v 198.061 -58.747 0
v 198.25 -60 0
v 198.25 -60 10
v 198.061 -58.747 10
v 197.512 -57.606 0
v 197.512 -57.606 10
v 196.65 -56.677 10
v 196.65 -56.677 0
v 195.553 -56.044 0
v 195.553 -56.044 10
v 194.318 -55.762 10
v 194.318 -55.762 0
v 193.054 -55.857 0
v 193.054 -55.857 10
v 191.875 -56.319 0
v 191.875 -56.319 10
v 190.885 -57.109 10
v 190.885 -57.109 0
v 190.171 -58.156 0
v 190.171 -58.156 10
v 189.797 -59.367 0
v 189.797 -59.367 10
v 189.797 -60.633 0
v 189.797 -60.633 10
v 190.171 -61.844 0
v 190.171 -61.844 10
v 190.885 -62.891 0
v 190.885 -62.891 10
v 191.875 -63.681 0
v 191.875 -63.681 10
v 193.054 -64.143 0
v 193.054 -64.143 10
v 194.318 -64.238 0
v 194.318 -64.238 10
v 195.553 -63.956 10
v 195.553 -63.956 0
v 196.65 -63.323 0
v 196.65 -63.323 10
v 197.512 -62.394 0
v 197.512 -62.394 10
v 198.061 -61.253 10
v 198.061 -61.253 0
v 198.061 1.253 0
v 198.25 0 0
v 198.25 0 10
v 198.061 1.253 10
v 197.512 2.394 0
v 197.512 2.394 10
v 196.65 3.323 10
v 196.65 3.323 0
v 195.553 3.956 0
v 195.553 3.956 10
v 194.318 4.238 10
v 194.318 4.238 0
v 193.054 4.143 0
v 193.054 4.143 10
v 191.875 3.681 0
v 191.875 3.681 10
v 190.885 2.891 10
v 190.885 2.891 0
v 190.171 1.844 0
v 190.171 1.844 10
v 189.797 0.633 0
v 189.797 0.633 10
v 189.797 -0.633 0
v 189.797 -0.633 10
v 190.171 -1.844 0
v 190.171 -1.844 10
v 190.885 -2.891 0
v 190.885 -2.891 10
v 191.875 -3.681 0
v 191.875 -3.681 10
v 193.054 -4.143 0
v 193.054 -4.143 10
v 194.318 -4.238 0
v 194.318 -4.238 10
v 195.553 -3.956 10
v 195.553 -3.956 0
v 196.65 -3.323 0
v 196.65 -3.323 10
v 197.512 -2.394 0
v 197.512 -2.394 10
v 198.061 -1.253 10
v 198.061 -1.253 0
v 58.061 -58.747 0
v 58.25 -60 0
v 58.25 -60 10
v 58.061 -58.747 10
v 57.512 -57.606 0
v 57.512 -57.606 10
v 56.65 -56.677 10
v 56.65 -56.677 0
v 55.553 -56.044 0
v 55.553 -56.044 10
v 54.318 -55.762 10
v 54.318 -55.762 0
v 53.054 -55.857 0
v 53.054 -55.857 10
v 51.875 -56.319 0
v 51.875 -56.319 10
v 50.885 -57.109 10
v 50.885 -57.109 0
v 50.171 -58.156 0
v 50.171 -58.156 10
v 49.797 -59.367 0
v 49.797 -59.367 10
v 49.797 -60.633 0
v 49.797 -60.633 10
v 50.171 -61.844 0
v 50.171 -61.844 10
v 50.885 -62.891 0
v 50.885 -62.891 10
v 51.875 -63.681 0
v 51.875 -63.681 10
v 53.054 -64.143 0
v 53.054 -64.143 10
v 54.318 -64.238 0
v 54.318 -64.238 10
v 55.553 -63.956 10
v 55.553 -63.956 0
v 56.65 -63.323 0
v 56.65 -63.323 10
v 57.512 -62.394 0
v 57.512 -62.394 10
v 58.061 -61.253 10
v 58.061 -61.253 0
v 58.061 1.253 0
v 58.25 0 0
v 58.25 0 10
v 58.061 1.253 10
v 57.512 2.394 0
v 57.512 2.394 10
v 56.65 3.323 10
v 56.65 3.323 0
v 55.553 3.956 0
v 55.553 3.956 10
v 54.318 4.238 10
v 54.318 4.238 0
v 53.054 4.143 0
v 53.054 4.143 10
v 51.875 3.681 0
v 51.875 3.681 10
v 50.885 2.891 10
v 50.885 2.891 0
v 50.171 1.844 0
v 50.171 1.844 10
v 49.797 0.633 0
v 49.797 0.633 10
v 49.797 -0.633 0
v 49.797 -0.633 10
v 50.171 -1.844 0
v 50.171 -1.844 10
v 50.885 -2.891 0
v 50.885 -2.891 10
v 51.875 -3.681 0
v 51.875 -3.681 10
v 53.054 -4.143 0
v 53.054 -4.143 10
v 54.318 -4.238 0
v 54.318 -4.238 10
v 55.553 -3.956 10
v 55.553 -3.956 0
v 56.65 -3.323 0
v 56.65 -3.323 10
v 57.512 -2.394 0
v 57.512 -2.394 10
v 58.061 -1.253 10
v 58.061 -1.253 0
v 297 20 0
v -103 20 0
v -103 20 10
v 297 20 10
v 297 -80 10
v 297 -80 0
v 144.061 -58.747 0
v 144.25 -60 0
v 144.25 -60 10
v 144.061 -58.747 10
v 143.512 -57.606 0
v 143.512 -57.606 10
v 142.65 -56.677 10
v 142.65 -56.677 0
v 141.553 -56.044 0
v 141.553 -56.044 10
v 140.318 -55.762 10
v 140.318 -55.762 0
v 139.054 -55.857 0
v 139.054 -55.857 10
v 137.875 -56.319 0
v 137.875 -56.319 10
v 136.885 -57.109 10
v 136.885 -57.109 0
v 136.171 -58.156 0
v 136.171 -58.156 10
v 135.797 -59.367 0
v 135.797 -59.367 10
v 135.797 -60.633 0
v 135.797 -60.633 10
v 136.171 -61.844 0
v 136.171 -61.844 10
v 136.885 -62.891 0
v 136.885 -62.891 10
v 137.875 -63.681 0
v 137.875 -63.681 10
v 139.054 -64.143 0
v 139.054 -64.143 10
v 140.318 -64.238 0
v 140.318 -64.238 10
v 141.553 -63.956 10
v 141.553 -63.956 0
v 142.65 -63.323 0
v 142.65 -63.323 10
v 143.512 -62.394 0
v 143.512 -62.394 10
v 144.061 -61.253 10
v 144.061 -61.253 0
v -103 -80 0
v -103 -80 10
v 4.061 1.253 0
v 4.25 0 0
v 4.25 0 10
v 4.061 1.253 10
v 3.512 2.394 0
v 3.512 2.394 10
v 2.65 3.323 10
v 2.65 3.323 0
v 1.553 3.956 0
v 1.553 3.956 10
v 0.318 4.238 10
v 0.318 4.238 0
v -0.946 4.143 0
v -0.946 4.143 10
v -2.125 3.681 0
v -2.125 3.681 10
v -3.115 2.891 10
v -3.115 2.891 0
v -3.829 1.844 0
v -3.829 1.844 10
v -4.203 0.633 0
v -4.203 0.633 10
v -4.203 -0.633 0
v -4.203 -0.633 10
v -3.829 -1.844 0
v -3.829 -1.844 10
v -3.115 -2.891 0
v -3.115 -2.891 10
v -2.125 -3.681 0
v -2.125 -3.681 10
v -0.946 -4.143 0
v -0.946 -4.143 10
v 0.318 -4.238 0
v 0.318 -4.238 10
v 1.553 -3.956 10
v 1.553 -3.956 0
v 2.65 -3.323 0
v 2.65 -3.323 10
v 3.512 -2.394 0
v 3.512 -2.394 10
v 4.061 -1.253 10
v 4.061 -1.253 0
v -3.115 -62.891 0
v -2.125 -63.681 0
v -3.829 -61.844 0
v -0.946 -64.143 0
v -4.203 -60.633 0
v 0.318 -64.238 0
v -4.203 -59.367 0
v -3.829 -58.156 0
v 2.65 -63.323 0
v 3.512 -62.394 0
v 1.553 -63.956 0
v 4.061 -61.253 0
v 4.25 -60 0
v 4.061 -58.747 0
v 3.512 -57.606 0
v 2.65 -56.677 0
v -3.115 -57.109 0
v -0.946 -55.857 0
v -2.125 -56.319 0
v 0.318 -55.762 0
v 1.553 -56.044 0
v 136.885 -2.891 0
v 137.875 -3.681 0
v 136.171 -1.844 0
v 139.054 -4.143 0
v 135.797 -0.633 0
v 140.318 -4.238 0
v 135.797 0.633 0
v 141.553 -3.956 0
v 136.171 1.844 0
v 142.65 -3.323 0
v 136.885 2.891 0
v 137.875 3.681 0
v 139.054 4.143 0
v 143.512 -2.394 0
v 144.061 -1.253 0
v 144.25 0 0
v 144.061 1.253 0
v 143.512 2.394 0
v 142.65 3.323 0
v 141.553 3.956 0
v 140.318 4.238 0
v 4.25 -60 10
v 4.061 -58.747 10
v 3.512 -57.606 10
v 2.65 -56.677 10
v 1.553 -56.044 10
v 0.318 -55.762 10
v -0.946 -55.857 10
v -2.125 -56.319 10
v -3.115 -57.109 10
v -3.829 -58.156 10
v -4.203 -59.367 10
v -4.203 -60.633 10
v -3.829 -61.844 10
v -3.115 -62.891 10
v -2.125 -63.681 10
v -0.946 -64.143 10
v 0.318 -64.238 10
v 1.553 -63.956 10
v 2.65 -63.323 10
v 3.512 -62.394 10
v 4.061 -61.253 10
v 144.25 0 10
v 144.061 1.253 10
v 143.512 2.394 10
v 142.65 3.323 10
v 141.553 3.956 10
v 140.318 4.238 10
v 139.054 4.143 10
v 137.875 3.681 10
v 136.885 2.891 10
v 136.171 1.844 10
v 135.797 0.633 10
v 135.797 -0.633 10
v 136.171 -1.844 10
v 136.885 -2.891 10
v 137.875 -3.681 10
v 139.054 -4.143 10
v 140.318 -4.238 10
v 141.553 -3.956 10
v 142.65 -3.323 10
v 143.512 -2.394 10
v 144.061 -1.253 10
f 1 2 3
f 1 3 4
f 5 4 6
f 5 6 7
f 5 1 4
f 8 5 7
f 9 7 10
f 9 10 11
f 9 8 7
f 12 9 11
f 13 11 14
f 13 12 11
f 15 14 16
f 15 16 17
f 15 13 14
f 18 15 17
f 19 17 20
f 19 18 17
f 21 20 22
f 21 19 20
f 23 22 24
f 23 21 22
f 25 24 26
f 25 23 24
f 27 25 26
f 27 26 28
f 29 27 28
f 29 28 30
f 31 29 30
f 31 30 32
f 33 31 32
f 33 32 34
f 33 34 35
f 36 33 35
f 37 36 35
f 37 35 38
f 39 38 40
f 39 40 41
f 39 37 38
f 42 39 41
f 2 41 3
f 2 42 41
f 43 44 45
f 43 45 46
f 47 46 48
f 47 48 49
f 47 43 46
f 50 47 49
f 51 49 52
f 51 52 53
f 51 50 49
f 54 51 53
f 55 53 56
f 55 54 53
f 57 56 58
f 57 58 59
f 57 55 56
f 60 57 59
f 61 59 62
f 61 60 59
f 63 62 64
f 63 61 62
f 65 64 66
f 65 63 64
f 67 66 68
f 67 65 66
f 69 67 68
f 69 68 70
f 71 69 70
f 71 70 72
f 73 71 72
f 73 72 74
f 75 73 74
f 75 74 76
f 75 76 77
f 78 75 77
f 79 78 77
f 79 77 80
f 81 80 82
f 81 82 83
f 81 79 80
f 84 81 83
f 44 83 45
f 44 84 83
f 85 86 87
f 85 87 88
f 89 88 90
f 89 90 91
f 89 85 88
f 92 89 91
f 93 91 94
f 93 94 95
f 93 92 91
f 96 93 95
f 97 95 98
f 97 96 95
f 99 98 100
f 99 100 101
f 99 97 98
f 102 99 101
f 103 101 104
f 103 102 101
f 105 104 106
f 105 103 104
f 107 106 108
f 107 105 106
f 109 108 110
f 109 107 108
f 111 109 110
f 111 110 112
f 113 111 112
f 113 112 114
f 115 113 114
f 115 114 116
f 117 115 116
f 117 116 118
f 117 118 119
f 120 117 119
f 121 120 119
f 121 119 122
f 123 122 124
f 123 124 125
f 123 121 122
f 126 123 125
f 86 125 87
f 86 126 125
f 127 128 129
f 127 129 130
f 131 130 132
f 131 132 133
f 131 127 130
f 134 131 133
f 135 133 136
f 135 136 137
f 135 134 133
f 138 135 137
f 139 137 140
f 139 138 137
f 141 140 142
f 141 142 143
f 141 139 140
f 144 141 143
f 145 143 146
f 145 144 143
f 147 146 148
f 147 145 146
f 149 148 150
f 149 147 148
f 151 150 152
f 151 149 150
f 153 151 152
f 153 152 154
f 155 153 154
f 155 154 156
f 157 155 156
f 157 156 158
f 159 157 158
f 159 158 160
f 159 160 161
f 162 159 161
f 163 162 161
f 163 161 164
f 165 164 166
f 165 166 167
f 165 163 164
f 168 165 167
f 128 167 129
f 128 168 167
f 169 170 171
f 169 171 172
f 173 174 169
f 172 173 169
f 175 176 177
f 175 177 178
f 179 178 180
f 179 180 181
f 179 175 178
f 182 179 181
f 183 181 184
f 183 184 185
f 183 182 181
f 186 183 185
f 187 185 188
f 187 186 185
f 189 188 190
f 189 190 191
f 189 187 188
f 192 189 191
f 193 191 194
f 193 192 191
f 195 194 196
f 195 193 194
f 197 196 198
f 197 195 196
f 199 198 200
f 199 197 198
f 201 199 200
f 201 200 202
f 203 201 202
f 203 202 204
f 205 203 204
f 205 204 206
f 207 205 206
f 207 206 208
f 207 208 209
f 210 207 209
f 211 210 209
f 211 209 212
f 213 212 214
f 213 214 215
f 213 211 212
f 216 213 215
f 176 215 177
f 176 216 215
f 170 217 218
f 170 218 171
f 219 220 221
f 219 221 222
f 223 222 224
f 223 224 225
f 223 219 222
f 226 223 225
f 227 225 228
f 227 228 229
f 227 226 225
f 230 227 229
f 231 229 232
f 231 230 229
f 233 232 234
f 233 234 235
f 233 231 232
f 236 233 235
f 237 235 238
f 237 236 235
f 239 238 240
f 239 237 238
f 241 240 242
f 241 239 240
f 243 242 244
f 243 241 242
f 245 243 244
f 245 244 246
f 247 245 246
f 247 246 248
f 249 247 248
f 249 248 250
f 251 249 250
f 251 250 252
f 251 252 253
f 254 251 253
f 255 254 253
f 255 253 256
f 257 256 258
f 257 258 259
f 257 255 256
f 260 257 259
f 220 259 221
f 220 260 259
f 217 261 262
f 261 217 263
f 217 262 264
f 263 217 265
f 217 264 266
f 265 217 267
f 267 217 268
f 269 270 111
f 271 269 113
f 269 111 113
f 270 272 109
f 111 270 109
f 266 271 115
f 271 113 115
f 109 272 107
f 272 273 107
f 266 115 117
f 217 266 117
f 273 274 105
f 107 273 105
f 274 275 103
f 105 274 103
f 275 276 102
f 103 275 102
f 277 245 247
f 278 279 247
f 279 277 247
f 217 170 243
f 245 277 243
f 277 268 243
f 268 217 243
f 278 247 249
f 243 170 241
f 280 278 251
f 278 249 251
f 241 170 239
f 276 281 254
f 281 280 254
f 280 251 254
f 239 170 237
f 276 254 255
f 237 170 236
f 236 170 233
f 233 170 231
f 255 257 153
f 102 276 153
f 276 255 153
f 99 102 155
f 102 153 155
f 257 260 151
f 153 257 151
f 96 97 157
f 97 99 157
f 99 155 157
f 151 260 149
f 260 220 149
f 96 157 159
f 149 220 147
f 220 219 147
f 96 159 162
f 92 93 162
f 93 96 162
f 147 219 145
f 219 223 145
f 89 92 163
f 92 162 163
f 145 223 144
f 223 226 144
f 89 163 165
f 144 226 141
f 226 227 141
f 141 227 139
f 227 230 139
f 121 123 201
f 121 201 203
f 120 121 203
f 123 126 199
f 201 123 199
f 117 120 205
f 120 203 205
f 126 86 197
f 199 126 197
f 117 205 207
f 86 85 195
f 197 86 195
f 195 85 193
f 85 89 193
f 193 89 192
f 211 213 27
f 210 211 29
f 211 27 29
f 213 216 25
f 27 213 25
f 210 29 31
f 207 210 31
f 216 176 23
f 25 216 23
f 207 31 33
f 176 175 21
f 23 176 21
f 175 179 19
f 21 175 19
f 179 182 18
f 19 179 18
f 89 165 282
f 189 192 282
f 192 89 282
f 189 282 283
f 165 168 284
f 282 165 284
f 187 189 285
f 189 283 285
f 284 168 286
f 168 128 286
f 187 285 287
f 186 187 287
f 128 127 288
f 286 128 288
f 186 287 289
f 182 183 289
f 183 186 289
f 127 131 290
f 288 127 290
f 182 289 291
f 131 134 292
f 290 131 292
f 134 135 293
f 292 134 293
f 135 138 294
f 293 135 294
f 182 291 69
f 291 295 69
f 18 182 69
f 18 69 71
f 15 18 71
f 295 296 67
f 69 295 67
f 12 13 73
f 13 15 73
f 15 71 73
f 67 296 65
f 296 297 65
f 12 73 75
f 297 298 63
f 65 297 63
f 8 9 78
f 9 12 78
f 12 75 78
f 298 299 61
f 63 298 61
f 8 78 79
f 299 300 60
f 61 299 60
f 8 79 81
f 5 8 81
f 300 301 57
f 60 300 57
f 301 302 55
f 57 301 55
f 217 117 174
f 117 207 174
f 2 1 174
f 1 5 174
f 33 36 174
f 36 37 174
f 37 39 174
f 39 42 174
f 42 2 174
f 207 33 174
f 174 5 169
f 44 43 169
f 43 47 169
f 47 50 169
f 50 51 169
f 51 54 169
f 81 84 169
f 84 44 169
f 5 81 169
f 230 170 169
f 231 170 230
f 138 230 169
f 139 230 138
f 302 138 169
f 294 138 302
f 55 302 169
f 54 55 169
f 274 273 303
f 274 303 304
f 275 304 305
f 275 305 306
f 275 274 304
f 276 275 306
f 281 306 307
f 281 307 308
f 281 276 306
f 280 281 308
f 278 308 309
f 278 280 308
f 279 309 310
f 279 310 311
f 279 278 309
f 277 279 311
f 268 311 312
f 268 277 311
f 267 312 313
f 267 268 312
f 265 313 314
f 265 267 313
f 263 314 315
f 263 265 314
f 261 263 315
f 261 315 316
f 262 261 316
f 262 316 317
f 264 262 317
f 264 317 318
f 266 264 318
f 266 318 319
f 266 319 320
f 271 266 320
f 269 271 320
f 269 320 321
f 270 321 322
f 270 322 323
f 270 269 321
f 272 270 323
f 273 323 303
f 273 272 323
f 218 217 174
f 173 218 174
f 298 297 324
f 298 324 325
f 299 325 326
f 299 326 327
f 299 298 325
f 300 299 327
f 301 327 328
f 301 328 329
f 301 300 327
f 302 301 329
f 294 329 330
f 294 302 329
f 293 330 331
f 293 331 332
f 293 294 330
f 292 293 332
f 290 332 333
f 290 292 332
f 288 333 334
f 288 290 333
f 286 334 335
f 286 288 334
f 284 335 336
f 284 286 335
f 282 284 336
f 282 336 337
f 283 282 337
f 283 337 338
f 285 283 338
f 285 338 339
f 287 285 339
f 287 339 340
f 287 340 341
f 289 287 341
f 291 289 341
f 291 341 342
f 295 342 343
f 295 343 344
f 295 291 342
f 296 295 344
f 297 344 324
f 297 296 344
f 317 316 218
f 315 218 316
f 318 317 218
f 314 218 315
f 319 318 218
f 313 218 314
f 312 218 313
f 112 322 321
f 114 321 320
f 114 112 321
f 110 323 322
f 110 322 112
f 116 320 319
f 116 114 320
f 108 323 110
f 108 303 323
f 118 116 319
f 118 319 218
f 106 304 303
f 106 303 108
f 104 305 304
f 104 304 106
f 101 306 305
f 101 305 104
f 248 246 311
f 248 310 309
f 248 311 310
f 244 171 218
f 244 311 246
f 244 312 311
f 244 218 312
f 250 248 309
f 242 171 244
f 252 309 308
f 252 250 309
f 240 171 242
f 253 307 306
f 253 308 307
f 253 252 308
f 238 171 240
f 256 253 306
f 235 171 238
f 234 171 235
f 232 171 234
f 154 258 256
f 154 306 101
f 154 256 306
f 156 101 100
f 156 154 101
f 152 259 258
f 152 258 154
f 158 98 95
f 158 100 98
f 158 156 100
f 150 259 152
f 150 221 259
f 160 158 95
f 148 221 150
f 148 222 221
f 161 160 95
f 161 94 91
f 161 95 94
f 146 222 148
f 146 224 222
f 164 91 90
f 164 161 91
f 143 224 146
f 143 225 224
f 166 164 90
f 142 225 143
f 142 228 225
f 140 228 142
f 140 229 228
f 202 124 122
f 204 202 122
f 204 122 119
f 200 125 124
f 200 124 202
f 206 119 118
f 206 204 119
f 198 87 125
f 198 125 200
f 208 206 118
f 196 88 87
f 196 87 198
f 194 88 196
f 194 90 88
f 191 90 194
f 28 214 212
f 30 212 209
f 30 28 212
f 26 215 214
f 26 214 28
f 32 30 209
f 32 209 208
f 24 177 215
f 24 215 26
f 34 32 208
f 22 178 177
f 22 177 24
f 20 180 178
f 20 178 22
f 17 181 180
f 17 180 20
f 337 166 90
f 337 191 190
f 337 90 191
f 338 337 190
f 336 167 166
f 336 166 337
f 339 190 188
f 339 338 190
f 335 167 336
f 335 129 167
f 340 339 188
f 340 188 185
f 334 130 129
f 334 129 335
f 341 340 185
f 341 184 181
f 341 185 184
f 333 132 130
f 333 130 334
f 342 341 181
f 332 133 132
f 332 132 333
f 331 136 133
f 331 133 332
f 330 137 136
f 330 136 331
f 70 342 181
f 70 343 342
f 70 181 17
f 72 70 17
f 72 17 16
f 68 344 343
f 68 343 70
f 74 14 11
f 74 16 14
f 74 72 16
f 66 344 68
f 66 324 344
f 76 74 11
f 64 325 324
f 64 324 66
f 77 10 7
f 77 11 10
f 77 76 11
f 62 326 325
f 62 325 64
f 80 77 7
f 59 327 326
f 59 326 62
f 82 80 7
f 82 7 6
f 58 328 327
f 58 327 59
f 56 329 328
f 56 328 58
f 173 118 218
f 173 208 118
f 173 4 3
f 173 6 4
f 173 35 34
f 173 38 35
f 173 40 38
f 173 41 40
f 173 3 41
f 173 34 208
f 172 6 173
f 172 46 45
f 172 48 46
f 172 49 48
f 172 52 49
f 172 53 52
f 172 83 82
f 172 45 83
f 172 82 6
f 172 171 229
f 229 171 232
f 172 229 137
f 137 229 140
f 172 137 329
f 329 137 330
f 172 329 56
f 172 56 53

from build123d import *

# Parameters (mm, degrees)
F0_W     = 400
F0_H     = 100
F0_R     = 4.25
F1_DEPTH = 10


with BuildPart() as f1:
    # F0 (on Top) → F1 (new body)
    with BuildSketch(Plane.XY):
        with Locations((97, -30)):
            Rectangle(F0_W, F0_H)
        with Locations((0, -60)):
            Circle(F0_R, mode=Mode.SUBTRACT)
        with Locations((54, -60)):
            Circle(F0_R, mode=Mode.SUBTRACT)
        with Locations((140, -60)):
            Circle(F0_R, mode=Mode.SUBTRACT)
        with Locations((194, -60)):
            Circle(F0_R, mode=Mode.SUBTRACT)
        Circle(F0_R, mode=Mode.SUBTRACT)
        with Locations((54, 0)):
            Circle(F0_R, mode=Mode.SUBTRACT)
        with Locations((140, 0)):
            Circle(F0_R, mode=Mode.SUBTRACT)
        with Locations((194, 0)):
            Circle(F0_R, mode=Mode.SUBTRACT)
    extrude(amount=F1_DEPTH)


solid = f1.part
